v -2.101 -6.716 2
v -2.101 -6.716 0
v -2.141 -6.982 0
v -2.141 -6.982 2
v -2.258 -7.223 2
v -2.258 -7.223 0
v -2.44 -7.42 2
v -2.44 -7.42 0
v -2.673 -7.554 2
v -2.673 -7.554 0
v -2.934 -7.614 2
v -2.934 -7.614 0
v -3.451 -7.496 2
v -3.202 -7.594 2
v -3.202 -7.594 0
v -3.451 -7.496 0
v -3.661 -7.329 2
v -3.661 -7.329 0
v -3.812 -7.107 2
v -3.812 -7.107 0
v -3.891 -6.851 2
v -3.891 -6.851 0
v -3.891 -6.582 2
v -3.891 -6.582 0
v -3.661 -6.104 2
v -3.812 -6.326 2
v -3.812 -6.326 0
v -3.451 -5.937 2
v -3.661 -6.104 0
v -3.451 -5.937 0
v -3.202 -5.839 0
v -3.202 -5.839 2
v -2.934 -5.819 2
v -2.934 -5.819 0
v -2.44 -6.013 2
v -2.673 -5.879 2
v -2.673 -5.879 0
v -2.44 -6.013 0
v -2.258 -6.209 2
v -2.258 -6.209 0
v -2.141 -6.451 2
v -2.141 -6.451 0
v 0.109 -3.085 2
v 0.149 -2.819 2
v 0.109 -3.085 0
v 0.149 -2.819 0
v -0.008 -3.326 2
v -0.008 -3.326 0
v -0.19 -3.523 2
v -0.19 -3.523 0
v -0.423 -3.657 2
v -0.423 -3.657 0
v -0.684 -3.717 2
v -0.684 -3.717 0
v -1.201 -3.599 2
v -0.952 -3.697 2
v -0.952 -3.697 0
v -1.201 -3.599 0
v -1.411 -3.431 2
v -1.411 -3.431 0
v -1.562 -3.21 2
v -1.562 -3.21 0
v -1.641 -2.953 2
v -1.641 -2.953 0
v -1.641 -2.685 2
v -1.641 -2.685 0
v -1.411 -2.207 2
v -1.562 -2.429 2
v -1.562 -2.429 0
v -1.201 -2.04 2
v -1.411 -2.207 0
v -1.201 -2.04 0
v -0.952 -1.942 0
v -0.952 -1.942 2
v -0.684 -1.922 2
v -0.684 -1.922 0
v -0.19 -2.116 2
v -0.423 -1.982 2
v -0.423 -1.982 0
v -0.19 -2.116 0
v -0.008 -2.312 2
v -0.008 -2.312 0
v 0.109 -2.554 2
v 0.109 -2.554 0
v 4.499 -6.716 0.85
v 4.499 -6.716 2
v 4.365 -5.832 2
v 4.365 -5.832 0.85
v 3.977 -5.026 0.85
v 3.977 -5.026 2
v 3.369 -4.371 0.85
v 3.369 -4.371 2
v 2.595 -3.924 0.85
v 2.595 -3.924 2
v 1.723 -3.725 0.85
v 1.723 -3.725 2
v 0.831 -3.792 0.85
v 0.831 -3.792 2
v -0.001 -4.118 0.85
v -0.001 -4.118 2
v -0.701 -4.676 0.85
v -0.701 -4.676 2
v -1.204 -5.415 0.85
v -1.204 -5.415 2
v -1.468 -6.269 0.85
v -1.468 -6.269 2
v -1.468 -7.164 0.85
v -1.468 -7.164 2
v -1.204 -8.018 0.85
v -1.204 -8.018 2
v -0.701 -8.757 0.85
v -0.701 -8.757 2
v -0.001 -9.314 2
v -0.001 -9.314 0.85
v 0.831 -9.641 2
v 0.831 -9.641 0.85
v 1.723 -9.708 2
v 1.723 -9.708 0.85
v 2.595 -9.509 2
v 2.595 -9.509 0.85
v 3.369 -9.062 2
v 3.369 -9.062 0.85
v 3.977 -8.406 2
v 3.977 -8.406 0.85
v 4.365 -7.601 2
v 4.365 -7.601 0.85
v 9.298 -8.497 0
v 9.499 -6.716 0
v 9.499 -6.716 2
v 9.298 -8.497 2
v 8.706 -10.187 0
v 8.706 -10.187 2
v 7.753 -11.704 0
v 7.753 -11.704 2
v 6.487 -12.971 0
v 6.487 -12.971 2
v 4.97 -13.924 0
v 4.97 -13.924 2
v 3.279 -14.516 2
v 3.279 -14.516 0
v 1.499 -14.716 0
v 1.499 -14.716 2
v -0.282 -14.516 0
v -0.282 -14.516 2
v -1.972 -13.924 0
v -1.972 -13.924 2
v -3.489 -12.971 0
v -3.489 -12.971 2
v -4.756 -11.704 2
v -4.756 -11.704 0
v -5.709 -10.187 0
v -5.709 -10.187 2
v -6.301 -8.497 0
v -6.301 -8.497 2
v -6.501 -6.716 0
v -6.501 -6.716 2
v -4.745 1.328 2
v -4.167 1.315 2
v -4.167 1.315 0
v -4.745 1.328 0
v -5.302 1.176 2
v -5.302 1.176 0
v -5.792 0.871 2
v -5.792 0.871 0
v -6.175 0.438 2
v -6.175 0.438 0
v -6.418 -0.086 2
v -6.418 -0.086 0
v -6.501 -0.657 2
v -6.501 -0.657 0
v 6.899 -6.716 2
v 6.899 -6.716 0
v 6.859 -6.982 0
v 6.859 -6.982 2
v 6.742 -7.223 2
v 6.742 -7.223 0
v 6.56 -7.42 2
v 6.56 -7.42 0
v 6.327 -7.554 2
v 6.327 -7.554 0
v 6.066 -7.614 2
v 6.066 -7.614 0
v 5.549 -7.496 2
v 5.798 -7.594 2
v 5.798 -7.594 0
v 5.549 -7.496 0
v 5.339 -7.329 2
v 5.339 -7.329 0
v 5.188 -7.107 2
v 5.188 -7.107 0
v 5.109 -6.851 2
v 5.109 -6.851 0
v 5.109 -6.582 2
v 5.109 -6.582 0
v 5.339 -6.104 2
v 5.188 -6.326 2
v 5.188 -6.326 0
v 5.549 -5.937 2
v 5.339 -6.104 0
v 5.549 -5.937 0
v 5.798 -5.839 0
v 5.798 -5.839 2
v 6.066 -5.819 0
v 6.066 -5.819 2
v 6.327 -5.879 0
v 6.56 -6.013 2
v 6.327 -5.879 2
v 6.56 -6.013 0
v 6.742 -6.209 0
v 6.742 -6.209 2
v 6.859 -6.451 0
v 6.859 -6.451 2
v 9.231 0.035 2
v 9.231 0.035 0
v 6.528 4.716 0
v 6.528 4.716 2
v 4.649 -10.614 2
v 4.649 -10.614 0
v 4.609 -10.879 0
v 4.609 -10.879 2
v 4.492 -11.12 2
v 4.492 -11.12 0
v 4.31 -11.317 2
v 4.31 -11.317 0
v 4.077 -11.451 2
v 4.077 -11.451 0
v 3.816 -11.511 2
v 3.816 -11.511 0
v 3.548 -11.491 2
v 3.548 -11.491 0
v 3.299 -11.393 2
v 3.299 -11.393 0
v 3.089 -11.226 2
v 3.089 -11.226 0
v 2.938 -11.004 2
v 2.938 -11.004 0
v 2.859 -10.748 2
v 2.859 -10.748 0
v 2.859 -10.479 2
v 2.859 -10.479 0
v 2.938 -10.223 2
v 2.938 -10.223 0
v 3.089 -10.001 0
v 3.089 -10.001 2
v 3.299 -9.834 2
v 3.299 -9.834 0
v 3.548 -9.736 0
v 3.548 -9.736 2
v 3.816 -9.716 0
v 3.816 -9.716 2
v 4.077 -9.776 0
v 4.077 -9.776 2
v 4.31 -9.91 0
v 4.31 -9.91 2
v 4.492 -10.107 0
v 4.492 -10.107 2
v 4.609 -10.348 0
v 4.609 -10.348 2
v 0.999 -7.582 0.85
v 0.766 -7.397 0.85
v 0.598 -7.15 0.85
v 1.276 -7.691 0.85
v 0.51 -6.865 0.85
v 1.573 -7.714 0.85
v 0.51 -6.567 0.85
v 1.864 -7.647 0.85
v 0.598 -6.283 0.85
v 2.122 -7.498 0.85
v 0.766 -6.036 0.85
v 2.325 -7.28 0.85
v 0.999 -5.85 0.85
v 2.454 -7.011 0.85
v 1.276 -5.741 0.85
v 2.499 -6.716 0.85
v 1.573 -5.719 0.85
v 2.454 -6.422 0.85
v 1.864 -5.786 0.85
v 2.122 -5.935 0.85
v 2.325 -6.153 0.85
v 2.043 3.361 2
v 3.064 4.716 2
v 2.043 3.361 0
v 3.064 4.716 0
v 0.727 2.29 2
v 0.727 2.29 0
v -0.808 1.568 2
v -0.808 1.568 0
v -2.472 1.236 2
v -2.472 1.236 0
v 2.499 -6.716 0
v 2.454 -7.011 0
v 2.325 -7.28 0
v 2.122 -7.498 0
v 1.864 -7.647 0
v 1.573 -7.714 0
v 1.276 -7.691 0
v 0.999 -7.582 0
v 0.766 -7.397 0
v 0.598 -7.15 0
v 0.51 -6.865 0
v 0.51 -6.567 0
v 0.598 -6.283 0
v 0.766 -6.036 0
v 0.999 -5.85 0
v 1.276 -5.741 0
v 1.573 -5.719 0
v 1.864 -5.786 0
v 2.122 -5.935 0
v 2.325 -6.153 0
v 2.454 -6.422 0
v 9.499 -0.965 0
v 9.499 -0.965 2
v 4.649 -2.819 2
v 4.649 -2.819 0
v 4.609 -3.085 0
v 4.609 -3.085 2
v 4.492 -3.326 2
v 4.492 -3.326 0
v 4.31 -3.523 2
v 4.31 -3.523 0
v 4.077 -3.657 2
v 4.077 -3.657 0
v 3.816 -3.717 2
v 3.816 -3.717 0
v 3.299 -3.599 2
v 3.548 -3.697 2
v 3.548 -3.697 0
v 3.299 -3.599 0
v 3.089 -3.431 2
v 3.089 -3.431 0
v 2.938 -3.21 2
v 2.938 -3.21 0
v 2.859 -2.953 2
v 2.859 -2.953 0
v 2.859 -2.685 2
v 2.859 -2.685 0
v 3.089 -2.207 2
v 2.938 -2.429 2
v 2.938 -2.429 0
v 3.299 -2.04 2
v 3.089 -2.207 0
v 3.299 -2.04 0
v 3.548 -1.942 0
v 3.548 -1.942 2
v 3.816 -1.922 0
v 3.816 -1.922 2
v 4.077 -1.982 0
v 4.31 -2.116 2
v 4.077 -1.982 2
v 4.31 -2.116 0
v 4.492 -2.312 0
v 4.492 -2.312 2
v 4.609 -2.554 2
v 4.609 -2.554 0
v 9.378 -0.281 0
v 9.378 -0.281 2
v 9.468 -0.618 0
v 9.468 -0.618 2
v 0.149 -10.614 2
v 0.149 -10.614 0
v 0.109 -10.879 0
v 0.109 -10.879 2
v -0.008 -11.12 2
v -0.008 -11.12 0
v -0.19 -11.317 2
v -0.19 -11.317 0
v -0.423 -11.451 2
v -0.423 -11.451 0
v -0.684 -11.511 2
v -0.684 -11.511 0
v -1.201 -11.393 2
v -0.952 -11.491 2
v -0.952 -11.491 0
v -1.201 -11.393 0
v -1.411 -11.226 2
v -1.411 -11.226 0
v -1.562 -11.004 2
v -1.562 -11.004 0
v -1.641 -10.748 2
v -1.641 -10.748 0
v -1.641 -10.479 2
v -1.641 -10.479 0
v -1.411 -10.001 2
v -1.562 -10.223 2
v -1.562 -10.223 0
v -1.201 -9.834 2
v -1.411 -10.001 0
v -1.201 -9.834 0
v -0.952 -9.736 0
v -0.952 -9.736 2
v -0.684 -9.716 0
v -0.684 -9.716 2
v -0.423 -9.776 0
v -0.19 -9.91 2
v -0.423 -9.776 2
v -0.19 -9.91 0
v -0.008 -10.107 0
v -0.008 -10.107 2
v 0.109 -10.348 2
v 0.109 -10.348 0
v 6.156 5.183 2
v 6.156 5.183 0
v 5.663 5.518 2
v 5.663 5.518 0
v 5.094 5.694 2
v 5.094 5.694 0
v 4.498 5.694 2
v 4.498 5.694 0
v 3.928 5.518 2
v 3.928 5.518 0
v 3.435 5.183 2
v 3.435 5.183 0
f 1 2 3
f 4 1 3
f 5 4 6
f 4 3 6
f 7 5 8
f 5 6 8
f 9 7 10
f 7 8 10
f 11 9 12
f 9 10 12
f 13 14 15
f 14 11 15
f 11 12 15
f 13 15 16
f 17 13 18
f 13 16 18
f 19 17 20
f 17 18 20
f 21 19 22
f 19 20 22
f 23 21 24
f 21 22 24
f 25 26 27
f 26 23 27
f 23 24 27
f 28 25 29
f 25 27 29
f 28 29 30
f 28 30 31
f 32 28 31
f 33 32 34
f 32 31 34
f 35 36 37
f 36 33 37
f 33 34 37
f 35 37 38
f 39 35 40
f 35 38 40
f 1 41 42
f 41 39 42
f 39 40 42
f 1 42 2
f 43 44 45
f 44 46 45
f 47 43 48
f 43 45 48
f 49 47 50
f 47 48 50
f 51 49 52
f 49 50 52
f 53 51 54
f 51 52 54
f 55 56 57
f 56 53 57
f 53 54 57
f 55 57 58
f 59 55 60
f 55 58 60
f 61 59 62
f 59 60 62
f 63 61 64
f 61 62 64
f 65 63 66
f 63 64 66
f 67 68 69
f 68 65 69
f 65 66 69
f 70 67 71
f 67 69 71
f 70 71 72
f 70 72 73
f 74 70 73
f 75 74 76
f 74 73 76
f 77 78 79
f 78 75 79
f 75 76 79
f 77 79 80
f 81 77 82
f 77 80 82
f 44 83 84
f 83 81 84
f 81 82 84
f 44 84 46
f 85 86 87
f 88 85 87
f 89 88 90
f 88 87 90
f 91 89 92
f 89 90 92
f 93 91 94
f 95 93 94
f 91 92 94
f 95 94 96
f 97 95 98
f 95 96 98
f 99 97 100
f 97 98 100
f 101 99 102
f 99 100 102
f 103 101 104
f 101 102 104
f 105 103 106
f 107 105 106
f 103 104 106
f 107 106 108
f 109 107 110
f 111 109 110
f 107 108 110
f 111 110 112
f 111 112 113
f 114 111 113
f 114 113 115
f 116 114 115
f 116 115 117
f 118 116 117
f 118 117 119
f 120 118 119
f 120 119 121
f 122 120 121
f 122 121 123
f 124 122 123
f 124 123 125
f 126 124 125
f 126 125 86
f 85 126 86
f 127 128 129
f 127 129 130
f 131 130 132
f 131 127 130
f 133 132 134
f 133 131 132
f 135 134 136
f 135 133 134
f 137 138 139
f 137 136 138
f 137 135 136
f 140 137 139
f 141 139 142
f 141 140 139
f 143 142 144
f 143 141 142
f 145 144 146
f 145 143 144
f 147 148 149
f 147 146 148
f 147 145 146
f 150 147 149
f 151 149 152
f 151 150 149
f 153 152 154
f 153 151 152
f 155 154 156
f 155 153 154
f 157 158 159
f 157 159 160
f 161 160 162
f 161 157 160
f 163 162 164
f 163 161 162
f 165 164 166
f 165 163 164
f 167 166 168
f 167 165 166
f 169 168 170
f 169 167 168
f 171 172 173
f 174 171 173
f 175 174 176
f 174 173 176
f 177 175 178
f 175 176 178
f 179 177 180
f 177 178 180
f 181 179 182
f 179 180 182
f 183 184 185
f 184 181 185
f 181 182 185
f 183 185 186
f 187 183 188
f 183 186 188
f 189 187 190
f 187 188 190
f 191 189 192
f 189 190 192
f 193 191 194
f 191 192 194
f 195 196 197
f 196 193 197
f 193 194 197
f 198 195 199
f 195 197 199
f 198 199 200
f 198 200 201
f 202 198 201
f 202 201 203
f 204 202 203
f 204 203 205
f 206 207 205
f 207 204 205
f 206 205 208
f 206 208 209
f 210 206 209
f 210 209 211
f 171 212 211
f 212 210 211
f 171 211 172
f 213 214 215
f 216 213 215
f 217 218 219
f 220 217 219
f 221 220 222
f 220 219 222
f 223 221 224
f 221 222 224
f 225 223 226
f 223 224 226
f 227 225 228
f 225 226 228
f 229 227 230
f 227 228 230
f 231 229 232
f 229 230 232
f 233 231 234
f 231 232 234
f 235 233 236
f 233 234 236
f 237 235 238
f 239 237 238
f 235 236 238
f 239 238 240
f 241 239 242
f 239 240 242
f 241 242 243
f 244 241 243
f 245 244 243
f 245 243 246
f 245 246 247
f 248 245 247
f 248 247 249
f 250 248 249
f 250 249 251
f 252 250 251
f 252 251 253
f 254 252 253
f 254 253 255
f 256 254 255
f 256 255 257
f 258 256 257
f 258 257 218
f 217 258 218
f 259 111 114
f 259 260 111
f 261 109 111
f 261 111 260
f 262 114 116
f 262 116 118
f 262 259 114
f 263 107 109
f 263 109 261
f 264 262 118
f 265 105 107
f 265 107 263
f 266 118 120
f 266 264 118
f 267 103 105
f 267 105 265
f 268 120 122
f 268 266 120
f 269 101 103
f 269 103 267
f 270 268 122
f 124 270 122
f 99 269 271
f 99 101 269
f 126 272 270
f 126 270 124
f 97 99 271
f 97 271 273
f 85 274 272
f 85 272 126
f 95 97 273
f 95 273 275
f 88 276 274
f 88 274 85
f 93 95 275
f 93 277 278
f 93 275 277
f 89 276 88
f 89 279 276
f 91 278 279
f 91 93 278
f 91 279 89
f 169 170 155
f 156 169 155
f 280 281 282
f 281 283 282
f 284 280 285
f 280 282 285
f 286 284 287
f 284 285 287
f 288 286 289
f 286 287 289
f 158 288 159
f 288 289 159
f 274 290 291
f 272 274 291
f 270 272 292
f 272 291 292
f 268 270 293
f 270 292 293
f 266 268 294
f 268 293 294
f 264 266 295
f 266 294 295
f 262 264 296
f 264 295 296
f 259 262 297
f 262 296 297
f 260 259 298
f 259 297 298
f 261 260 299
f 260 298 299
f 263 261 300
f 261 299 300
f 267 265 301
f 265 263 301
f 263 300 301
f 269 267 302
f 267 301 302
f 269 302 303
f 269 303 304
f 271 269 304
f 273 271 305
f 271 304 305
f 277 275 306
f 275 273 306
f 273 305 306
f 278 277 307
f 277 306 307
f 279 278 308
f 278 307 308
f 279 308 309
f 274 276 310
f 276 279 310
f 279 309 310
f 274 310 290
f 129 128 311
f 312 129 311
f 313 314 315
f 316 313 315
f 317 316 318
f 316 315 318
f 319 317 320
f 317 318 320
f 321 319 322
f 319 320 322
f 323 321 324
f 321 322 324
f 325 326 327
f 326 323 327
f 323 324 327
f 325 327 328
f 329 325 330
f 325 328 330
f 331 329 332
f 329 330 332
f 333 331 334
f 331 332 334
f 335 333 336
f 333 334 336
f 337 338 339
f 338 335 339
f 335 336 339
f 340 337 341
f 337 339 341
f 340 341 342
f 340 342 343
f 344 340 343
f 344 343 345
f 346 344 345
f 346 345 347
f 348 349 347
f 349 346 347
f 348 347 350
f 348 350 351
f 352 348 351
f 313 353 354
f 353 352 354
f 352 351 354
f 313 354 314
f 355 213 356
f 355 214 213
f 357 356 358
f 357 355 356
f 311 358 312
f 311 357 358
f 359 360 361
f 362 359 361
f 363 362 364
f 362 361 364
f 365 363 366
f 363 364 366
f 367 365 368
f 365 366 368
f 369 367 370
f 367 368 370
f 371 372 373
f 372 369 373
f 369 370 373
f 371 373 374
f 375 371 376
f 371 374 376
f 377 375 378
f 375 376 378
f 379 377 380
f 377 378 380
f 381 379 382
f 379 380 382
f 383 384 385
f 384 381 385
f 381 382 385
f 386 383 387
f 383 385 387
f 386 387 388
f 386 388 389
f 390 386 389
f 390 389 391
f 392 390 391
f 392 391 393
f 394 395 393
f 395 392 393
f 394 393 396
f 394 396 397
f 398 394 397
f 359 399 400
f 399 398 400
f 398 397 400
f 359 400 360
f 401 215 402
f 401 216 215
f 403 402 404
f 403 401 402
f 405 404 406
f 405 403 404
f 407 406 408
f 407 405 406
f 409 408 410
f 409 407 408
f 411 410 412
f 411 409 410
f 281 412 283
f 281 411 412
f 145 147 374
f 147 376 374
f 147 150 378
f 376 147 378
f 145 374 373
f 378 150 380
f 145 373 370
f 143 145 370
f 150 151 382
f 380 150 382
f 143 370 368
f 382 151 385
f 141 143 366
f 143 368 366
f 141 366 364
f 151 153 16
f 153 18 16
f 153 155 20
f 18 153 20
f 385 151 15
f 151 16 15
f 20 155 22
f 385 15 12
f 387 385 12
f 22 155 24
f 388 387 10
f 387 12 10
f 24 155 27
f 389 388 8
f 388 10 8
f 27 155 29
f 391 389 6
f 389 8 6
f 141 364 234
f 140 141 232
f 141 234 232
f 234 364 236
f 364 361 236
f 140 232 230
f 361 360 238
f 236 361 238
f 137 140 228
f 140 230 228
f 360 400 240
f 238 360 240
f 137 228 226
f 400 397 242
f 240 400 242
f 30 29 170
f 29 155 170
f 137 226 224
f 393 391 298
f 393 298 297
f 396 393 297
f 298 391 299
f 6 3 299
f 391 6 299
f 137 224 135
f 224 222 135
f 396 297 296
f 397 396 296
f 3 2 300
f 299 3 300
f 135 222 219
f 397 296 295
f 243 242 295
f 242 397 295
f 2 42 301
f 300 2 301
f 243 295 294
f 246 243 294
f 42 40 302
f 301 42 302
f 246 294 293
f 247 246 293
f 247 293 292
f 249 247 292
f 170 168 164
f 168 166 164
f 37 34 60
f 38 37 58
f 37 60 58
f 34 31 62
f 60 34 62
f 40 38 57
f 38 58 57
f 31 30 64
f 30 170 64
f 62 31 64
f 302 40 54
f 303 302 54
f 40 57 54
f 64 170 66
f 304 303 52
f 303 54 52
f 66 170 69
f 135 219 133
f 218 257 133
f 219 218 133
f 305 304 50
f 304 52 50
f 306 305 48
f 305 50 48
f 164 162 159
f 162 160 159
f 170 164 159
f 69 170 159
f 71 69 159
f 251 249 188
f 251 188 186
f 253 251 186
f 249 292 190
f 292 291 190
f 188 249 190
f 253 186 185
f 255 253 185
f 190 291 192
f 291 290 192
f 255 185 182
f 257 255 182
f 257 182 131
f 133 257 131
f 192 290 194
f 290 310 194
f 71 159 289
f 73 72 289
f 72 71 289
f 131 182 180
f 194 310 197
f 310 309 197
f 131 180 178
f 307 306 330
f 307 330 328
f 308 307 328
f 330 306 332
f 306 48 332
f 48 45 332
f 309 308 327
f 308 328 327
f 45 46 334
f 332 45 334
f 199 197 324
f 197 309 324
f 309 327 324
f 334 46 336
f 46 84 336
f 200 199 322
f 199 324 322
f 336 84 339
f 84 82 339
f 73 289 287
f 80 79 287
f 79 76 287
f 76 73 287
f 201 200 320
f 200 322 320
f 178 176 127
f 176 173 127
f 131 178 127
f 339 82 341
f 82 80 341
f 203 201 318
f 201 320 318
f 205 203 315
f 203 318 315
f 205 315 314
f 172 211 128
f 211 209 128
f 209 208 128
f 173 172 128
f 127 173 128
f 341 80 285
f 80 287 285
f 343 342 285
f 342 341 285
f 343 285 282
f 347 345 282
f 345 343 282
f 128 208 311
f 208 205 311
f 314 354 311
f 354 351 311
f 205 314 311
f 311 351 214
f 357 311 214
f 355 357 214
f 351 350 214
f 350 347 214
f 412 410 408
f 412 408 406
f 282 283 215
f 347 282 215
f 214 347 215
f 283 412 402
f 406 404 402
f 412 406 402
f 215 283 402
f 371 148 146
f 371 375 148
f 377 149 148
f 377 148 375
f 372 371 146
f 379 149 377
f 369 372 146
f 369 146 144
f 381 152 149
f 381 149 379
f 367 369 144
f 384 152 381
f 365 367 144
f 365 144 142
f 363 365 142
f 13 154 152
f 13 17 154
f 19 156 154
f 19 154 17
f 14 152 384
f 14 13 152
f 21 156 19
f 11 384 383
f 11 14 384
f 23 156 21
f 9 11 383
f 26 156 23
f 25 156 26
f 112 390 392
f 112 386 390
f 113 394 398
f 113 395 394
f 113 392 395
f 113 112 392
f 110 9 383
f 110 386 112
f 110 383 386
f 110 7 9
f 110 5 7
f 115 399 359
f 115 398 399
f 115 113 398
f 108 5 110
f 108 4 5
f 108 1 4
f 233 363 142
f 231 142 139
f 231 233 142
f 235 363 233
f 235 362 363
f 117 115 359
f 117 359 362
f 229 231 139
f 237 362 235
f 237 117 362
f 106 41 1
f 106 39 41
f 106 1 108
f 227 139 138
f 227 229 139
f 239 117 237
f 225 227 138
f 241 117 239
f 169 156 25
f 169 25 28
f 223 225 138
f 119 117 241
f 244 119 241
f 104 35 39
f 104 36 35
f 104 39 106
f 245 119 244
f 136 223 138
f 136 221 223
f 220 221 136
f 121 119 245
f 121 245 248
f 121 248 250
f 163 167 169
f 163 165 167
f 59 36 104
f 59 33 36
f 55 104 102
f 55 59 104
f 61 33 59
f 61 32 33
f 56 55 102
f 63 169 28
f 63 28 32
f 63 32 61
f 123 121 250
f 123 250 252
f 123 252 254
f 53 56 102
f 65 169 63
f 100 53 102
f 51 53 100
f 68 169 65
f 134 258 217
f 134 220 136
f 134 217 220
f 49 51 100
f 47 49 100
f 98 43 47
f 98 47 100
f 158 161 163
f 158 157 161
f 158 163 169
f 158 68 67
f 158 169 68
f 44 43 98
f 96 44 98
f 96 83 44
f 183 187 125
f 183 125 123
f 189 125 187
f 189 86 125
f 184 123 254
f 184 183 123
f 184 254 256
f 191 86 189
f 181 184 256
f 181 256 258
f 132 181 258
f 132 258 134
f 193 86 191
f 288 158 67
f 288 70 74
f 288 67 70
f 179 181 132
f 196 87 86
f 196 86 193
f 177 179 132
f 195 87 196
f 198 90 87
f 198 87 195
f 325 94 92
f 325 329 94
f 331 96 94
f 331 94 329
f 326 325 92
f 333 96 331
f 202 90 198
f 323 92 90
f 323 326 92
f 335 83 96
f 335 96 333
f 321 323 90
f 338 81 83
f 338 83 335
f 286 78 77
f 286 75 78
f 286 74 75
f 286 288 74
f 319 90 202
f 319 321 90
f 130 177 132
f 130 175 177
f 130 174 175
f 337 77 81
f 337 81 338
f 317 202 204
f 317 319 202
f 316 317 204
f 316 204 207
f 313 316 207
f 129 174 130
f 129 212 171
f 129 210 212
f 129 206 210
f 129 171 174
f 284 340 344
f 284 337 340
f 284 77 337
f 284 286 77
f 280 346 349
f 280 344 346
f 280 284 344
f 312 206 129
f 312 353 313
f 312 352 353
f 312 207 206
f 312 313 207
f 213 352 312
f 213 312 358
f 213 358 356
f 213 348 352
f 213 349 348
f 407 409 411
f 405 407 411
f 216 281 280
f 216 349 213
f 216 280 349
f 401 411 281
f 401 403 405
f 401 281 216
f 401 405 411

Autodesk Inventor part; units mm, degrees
ref_plane "YZ Plane" through (0, 0, 0) normal (1, 0, 0) x (0, 1, 0)
ref_plane "XZ Plane" through (0, 0, 0) normal (0, 1, 0) x (-1, 0, 0)
ref_plane "XY Plane" through (0, 0, 0) normal (0, 0, 1) x (1, 0, 0)
ref_plane "作業平面1" through (0, 0, 0) normal (0, 0, 1) x (1, 0, 0)
sketch "スケッチ1" plane through (0, 0, 0) normal (0, 0, 1) x (1, 0, 0)
  arc A0 (-6.5014, -6.7164) -> (9.4986, -6.7164) centre (1.4986, -6.7164) ccw projected
  line L0 (9.4986, -6.7164) -> (9.4986, -0.9651) projected
  arc A1 (9.4986, -0.9651) -> (9.2306, 0.0349) centre (7.4986, -0.9651) ccw projected
  line L1 (9.2306, 0.0349) -> (2.6306, 11.4664) projected
  arc A2 (2.6306, 11.4664) -> (-8.6277, 4.9664) centre (-2.9986, 8.2164) ccw projected
  line L2 (-8.6277, 4.9664) -> (-6.9034, 1.9797) projected
  arc A3 (-6.5014, 0.4797) -> (-6.9034, 1.9797) centre (-9.5014, 0.4797) ccw projected
  line L3 (-6.5014, 0.4797) -> (-6.5014, -6.7164) projected
  circle A4 centre (-2.9986, 8.2164) radius 3 projected
  circle A5 centre (1.4986, -6.7164) radius 1 projected
  circle A6 centre (5.9986, -6.7164) radius 0.9
  line L4 (5.9986, -6.7164) -> (1.4986, -6.7164) construction
  circle A7 centre (3.7486, -2.8193) radius 0.9
  circle A8 centre (-0.7514, -2.8193) radius 0.9
  circle A9 centre (-3.0014, -6.7164) radius 0.9
  circle A10 centre (-0.7514, -10.6135) radius 0.9
  circle A11 centre (3.7486, -10.6135) radius 0.9
  circle A12 centre (1.4986, -6.7164) radius 3
  arc A13 (-6.5014, 2.1559) -> (3.9296, 9.2164) centre (-2.9986, 8.2164) ccw
  circle A14 centre (1.4986, -6.7164) radius 1
  line L5 (-6.5014, 2.1559) -> (-6.5014, 0.4797)
  circle A15 centre (3.9986, -11.0465) radius 1.25 projected
  point P0 (0, 0)
  dimension "d0" = 4.5
  dimension "d1" = 1.8
  dimension "d4" = 360
  dimension "d6" = 6
  dimension "d7" = 7
  dimension "d10" = 2
extrude "押し出し1" add sketch "スケッチ1" along normal blind 2 contours L3 L5 A13 L1 A1 L0 A0 | A11 A15 | A12 picked at (4.4817, -11.8763)
sketch "スケッチ2" plane through (0, 0, 2) normal (0, 0, 1) x (1, 0, 0)
  line L0 (9.2306, 0.0349) -> (3.9296, 9.2164) projected
  line L1 (-6.5014, 2.1559) -> (-6.5014, -6.7164) projected
  arc A0 (-6.5014, -6.7164) -> (9.4986, -6.7164) centre (1.4986, -6.7164) ccw projected
  line L2 (9.4986, -6.7164) -> (9.4986, -0.9651) projected
  arc A1 (9.4986, -0.9651) -> (9.2306, 0.0349) centre (7.4986, -0.9651) ccw projected
  circle A2 centre (3.7486, -10.6135) radius 0.9 projected
  circle A3 centre (-0.7514, -10.6135) radius 0.9 projected
  circle A4 centre (-3.0014, -6.7164) radius 0.9 projected
  circle A5 centre (-0.7514, -2.8193) radius 0.9 projected
  circle A6 centre (3.7486, -2.8193) radius 0.9 projected
  circle A7 centre (5.9986, -6.7164) radius 0.9 projected
  circle A8 centre (1.4986, -6.7164) radius 1 projected
  circle A9 centre (1.4986, -6.7164) radius 3
  arc A10 (-6.5014, 2.1559) -> (3.9296, 9.2164) centre (-2.9986, 8.2164) ccw projected
  point P0 (0, 0)
  dimension "d11" = 6
extrude "押し出し2" cut sketch "スケッチ2" against normal blind 1.15 contours A9
fillet "フィレット1" radius 2 2 edges at (3.9296, 9.2164, 1) (-6.5014, 2.1559, 1)
properties part number "Motor_Mount"
